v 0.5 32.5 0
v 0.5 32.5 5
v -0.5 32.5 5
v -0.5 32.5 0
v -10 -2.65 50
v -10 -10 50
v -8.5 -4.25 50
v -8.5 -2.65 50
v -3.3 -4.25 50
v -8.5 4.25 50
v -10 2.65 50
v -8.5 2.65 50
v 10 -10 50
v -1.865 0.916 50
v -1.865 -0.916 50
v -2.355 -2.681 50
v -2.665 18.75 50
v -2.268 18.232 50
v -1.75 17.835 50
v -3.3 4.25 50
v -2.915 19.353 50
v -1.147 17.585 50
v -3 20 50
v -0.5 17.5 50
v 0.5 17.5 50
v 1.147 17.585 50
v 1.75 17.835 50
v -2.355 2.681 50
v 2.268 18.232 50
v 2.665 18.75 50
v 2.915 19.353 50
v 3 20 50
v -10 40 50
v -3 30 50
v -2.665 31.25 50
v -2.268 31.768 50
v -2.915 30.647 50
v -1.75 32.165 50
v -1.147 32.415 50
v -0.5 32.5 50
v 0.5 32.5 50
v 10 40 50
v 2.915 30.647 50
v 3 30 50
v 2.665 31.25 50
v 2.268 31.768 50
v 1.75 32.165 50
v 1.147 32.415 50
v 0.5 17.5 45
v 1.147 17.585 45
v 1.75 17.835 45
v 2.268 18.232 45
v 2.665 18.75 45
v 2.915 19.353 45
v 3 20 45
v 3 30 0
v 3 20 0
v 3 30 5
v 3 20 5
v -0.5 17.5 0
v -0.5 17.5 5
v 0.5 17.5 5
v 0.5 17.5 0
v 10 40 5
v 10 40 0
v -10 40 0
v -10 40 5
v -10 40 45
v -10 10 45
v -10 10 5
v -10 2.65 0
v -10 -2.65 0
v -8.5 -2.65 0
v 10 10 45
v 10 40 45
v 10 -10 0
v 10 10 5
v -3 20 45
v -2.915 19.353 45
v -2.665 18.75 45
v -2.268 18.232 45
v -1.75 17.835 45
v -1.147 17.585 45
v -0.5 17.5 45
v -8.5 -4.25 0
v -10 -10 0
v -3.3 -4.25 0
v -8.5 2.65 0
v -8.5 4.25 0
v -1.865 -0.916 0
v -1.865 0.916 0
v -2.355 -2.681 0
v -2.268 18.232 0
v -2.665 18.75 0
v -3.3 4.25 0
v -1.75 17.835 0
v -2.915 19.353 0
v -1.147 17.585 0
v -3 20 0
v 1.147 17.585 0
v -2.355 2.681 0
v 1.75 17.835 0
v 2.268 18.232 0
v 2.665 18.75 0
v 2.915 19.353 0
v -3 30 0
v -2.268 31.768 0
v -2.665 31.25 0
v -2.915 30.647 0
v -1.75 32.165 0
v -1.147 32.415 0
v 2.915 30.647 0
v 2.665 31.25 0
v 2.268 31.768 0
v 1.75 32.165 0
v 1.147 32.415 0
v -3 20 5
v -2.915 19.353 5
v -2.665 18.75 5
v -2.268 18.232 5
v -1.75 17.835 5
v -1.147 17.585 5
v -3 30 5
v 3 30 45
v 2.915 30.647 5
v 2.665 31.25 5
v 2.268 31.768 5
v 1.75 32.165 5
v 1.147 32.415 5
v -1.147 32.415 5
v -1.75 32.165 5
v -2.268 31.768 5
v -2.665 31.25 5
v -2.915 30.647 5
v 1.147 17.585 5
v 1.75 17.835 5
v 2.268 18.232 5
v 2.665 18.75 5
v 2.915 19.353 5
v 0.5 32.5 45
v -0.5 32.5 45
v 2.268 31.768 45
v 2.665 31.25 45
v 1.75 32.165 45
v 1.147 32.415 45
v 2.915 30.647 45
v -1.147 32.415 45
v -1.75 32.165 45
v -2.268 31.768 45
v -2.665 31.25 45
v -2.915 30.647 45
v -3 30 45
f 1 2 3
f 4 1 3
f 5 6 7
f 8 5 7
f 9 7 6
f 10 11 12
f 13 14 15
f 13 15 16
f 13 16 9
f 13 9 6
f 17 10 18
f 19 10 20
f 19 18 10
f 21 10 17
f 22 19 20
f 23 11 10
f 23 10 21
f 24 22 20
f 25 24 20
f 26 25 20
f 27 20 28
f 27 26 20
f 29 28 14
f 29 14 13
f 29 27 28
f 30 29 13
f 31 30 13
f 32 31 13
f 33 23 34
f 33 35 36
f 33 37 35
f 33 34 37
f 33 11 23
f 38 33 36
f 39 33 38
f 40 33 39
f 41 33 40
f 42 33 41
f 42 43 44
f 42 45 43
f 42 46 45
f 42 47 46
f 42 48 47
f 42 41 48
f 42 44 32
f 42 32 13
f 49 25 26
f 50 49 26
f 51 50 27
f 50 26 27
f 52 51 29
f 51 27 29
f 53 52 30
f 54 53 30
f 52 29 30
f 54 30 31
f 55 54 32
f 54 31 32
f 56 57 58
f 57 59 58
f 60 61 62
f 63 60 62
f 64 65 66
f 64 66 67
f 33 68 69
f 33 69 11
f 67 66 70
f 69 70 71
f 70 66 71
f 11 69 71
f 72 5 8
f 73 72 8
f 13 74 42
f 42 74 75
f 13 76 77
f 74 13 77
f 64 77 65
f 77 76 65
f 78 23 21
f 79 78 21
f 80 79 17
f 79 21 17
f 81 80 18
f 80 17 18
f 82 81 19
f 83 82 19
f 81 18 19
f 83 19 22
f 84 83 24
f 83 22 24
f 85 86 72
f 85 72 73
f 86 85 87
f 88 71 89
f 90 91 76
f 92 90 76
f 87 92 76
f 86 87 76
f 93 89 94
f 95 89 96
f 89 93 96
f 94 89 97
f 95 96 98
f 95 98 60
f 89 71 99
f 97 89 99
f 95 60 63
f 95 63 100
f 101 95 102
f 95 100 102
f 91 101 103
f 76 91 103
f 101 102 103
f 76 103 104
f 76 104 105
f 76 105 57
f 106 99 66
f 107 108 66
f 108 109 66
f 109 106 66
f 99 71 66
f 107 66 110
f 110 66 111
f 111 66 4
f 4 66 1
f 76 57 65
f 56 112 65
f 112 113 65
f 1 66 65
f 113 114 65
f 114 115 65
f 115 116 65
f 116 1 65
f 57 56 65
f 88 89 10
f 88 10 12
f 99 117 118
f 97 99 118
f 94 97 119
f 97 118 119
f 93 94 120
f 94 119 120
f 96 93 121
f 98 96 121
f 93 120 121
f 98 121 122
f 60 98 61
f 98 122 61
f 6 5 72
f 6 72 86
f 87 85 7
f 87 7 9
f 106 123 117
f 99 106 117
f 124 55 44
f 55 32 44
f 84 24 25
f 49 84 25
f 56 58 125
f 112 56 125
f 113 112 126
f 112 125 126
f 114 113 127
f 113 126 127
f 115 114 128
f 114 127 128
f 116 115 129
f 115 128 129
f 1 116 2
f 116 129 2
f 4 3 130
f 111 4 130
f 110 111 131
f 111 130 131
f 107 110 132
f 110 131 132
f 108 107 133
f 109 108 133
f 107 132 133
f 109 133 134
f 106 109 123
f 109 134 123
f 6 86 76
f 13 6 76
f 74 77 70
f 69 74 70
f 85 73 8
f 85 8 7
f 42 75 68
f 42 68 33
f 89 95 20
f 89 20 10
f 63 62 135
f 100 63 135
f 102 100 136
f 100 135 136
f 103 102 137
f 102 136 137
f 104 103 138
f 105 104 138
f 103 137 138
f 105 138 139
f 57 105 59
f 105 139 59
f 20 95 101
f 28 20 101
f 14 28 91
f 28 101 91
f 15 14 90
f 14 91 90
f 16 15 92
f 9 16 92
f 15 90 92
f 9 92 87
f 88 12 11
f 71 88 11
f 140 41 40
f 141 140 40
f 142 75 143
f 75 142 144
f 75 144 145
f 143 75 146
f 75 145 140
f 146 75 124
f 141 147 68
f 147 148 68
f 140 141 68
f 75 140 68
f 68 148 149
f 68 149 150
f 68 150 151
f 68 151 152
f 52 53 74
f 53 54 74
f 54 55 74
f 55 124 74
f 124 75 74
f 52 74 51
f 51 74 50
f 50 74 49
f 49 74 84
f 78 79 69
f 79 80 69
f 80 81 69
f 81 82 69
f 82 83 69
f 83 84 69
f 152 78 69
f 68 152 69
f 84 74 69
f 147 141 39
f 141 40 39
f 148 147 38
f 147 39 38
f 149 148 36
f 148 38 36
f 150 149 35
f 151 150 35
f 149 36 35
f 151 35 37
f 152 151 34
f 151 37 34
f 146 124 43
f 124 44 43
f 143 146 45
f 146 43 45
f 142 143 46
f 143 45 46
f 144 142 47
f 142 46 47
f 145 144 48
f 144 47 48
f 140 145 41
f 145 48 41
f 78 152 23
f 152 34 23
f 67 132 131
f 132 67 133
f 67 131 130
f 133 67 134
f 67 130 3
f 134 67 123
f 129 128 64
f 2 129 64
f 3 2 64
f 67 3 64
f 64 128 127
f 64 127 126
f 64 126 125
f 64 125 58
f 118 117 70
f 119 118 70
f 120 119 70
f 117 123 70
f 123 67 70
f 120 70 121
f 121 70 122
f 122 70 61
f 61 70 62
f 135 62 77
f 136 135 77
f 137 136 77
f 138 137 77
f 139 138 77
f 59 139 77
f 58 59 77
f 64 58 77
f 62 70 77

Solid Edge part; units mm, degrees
sketch "Sketch1" plane through (0, 0, 0) normal (0, 0, 1) x (1, 0, 0)
  line L0 (-10, -10) -> (10, -10)
  line L1 (10, -10) -> (10, 10)
  line L2 (10, 10) -> (-10, 10)
  line L3 (-10, 10) -> (-10, 2.65)
  line L4 (-8.5, 2.65) -> (-10, 2.65)
  line L5 (-8.5, 4.25) -> (-8.5, 2.65)
  line L6 (-3.3, 4.25) -> (-8.5, 4.25)
  arc A0 (-3.3, 4.25) -> (-3.3, -4.25) centre (-8.5833, 0) cw
  line L7 (-8.5, -4.25) -> (-3.3, -4.25)
  line L8 (-8.5, -2.65) -> (-8.5, -4.25)
  line L9 (-10, -2.65) -> (-8.5, -2.65)
  line L10 (-10, -2.65) -> (-10, -10)
extrude "Protrusion1" add sketch "Sketch1" along normal blind 50
sketch "Sketch2" plane through (0, 10, 25) normal (0, 1, 0) x (0, 0, -1)
  line L0 (-25, -10) -> (-20, -10)
  line L1 (-20, -10) -> (-20, 10)
  line L2 (-20, 10) -> (-25, 10)
  line L3 (-25, 10) -> (-25, -10)
  line L4 (25, 10) -> (20, 10)
  line L5 (20, 10) -> (20, -10)
  line L6 (20, -10) -> (25, -10)
  line L7 (25, -10) -> (25, 10)
extrude "Protrusion2" add sketch "Sketch2" along normal blind 30
sketch "Sketch3" plane through (0, 15, 50) normal (0, 0, 1) x (0, 1, 0)
  arc A0 (15, -3) -> (17.5, -0.5) centre (15, -0.5) ccw
  line L0 (17.5, -0.5) -> (17.5, 0.5)
  arc A1 (17.5, 0.5) -> (15, 3) centre (15, 0.5) ccw
  line L1 (15, 3) -> (5, 3)
  arc A2 (5, 3) -> (2.5, 0.5) centre (5, 0.5) ccw
  line L2 (2.5, 0.5) -> (2.5, -0.5)
  arc A3 (5, -3) -> (2.5, -0.5) centre (5, -0.5) cw
  line L3 (5, -3) -> (15, -3)
extrude "Cutout1" cut sketch "Sketch3" against normal blind 70
